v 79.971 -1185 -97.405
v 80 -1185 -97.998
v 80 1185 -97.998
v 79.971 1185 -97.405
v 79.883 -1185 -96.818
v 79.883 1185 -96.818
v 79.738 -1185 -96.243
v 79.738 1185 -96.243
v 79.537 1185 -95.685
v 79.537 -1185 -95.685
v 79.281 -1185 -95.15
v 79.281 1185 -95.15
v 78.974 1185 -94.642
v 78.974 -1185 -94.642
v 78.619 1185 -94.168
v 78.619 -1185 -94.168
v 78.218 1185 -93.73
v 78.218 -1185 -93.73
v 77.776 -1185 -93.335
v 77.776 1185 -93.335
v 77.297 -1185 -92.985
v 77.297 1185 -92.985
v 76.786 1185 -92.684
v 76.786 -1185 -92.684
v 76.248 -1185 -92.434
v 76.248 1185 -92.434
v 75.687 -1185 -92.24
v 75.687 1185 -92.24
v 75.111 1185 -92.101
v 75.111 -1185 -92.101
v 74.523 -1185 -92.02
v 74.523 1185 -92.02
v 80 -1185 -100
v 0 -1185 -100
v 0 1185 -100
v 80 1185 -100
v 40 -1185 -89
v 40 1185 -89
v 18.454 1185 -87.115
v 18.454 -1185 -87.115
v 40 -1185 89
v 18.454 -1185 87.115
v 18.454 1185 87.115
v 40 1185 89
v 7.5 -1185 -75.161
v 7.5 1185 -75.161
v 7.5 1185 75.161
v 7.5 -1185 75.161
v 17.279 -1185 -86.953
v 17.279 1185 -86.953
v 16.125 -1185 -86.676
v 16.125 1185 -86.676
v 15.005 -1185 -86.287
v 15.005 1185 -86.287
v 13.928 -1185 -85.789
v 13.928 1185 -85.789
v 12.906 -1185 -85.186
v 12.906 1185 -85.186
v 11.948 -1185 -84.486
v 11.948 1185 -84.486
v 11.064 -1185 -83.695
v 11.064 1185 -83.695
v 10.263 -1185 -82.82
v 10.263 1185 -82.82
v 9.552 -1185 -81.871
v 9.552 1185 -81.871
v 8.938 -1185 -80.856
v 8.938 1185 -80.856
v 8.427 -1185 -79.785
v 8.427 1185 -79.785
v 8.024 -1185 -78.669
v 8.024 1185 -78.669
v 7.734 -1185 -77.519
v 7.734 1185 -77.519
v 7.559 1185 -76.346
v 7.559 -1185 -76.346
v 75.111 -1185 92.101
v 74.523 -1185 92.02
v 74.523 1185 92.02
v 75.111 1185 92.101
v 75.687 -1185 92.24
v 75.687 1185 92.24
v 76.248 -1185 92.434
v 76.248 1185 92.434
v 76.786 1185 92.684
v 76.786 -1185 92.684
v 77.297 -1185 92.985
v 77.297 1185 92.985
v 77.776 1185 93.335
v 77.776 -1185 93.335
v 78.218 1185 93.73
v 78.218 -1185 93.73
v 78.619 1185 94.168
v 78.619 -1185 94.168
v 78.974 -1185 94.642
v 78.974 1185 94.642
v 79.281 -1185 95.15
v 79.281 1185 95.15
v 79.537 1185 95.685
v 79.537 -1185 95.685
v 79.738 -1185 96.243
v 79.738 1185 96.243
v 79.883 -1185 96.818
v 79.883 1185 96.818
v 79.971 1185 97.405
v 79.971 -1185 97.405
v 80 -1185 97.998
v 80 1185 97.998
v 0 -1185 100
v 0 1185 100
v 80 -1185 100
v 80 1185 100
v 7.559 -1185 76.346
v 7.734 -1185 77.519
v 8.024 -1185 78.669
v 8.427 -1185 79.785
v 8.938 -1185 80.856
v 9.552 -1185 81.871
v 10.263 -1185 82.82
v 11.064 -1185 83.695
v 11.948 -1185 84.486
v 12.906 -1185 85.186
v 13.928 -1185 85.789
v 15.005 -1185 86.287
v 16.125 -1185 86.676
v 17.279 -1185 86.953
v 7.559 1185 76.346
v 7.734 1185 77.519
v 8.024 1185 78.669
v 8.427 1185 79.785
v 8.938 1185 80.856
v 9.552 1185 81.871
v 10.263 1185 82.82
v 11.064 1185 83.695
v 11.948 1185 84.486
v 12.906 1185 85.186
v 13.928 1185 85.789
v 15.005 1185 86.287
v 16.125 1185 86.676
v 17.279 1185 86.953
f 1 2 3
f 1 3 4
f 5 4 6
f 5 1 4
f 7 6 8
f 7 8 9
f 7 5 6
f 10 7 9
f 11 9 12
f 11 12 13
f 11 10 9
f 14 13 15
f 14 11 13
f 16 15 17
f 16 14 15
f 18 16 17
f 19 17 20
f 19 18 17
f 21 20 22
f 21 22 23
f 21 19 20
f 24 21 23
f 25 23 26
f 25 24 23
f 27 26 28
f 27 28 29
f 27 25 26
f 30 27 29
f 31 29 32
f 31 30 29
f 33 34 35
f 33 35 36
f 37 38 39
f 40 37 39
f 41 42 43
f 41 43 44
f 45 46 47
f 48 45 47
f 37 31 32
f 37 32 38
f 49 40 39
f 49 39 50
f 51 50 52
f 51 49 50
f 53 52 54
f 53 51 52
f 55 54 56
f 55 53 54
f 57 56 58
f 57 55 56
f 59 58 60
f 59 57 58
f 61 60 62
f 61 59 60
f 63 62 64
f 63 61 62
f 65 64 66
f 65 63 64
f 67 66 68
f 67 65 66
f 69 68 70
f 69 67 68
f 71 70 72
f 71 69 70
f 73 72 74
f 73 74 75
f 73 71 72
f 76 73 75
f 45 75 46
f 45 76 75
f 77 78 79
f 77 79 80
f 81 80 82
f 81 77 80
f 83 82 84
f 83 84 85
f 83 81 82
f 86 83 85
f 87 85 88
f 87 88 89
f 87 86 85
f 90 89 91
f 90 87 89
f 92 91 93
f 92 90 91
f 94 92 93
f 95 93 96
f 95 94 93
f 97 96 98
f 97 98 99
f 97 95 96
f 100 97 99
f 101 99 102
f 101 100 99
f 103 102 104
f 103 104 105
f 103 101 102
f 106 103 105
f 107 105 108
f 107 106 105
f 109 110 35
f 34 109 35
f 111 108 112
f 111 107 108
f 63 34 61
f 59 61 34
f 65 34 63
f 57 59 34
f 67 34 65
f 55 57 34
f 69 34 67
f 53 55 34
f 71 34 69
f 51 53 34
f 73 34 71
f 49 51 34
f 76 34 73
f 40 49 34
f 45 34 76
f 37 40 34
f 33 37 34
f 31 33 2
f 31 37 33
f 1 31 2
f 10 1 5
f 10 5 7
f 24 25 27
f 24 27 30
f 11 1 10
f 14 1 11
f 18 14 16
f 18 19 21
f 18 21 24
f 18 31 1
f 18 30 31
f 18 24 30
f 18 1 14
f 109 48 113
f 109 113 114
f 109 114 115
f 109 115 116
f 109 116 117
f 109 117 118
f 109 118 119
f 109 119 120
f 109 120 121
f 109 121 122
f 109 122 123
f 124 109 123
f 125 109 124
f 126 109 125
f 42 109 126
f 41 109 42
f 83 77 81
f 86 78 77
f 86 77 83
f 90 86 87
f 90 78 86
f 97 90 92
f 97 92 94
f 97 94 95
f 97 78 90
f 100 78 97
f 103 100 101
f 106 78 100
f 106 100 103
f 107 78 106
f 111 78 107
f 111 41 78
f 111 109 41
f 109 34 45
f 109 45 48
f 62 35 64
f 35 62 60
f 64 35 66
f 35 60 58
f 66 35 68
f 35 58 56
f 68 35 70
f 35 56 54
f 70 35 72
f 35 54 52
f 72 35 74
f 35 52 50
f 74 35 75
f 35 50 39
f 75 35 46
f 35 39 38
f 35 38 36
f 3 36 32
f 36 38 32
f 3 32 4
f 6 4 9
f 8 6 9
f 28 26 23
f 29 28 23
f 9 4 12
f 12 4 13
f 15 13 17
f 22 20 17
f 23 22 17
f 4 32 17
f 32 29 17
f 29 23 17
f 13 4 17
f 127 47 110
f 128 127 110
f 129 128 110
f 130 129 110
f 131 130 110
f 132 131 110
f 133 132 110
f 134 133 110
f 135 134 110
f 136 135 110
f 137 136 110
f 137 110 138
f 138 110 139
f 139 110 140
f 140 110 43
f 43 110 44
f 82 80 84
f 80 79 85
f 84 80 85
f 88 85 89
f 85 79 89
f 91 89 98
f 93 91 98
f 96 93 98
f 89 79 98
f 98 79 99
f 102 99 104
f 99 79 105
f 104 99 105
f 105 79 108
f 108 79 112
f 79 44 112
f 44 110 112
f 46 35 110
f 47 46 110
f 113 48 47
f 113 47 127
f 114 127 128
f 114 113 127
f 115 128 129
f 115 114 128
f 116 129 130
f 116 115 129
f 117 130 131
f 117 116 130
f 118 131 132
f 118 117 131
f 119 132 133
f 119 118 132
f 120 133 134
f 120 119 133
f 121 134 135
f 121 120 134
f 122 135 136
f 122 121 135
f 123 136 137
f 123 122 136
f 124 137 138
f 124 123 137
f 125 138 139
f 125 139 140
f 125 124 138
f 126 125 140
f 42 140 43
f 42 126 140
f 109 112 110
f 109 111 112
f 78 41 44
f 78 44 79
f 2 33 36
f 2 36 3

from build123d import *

# Parameters (mm, degrees)
F1_DEPTH = 1185


with BuildPart() as f1:
    # F0 (on Front) → F1 (new body, symmetric)
    with BuildSketch(Plane.XZ):
        with BuildLine():
            Line((0, 100), (0, 0))
            Line((0, 0), (7.5, 0))
            Line((7.5, 0), (7.5, 75.160644))
            ThreePointArc((7.5, 75.160644), (10.652672, 83.267727), (18.454131, 87.114981))
            Line((18.454131, 87.114981), (40, 89))
            Line((40, 89), (40, 100))
            Line((40, 100), (0, 100))
        make_face()
        with BuildLine():
            Line((80, 100), (40, 100))
            Line((40, 100), (40, 89))
            Line((40, 89), (74.522934, 92.020365))
            ThreePointArc((74.522934, 92.020365), (78.423664, 93.943992), (80, 97.997534))
            Line((80, 97.997534), (80, 100))
        make_face()
        with BuildLine():
            Line((7.5, 0), (0, 0))
            Line((0, 0), (0, -100))
            Line((0, -100), (40, -100))
            Line((40, -100), (40, -89))
            Line((40, -89), (18.454131, -87.114981))
            ThreePointArc((18.454131, -87.114981), (10.652672, -83.267727), (7.5, -75.160644))
            Line((7.5, -75.160644), (7.5, 0))
        make_face()
        with BuildLine():
            Line((40, -89), (40, -100))
            Line((40, -100), (80, -100))
            Line((80, -100), (80, -97.997534))
            ThreePointArc((80, -97.997534), (78.423664, -93.943992), (74.522934, -92.020365))
            Line((74.522934, -92.020365), (40, -89))
        make_face()
    extrude(amount=F1_DEPTH, both=True)


solid = f1.part
